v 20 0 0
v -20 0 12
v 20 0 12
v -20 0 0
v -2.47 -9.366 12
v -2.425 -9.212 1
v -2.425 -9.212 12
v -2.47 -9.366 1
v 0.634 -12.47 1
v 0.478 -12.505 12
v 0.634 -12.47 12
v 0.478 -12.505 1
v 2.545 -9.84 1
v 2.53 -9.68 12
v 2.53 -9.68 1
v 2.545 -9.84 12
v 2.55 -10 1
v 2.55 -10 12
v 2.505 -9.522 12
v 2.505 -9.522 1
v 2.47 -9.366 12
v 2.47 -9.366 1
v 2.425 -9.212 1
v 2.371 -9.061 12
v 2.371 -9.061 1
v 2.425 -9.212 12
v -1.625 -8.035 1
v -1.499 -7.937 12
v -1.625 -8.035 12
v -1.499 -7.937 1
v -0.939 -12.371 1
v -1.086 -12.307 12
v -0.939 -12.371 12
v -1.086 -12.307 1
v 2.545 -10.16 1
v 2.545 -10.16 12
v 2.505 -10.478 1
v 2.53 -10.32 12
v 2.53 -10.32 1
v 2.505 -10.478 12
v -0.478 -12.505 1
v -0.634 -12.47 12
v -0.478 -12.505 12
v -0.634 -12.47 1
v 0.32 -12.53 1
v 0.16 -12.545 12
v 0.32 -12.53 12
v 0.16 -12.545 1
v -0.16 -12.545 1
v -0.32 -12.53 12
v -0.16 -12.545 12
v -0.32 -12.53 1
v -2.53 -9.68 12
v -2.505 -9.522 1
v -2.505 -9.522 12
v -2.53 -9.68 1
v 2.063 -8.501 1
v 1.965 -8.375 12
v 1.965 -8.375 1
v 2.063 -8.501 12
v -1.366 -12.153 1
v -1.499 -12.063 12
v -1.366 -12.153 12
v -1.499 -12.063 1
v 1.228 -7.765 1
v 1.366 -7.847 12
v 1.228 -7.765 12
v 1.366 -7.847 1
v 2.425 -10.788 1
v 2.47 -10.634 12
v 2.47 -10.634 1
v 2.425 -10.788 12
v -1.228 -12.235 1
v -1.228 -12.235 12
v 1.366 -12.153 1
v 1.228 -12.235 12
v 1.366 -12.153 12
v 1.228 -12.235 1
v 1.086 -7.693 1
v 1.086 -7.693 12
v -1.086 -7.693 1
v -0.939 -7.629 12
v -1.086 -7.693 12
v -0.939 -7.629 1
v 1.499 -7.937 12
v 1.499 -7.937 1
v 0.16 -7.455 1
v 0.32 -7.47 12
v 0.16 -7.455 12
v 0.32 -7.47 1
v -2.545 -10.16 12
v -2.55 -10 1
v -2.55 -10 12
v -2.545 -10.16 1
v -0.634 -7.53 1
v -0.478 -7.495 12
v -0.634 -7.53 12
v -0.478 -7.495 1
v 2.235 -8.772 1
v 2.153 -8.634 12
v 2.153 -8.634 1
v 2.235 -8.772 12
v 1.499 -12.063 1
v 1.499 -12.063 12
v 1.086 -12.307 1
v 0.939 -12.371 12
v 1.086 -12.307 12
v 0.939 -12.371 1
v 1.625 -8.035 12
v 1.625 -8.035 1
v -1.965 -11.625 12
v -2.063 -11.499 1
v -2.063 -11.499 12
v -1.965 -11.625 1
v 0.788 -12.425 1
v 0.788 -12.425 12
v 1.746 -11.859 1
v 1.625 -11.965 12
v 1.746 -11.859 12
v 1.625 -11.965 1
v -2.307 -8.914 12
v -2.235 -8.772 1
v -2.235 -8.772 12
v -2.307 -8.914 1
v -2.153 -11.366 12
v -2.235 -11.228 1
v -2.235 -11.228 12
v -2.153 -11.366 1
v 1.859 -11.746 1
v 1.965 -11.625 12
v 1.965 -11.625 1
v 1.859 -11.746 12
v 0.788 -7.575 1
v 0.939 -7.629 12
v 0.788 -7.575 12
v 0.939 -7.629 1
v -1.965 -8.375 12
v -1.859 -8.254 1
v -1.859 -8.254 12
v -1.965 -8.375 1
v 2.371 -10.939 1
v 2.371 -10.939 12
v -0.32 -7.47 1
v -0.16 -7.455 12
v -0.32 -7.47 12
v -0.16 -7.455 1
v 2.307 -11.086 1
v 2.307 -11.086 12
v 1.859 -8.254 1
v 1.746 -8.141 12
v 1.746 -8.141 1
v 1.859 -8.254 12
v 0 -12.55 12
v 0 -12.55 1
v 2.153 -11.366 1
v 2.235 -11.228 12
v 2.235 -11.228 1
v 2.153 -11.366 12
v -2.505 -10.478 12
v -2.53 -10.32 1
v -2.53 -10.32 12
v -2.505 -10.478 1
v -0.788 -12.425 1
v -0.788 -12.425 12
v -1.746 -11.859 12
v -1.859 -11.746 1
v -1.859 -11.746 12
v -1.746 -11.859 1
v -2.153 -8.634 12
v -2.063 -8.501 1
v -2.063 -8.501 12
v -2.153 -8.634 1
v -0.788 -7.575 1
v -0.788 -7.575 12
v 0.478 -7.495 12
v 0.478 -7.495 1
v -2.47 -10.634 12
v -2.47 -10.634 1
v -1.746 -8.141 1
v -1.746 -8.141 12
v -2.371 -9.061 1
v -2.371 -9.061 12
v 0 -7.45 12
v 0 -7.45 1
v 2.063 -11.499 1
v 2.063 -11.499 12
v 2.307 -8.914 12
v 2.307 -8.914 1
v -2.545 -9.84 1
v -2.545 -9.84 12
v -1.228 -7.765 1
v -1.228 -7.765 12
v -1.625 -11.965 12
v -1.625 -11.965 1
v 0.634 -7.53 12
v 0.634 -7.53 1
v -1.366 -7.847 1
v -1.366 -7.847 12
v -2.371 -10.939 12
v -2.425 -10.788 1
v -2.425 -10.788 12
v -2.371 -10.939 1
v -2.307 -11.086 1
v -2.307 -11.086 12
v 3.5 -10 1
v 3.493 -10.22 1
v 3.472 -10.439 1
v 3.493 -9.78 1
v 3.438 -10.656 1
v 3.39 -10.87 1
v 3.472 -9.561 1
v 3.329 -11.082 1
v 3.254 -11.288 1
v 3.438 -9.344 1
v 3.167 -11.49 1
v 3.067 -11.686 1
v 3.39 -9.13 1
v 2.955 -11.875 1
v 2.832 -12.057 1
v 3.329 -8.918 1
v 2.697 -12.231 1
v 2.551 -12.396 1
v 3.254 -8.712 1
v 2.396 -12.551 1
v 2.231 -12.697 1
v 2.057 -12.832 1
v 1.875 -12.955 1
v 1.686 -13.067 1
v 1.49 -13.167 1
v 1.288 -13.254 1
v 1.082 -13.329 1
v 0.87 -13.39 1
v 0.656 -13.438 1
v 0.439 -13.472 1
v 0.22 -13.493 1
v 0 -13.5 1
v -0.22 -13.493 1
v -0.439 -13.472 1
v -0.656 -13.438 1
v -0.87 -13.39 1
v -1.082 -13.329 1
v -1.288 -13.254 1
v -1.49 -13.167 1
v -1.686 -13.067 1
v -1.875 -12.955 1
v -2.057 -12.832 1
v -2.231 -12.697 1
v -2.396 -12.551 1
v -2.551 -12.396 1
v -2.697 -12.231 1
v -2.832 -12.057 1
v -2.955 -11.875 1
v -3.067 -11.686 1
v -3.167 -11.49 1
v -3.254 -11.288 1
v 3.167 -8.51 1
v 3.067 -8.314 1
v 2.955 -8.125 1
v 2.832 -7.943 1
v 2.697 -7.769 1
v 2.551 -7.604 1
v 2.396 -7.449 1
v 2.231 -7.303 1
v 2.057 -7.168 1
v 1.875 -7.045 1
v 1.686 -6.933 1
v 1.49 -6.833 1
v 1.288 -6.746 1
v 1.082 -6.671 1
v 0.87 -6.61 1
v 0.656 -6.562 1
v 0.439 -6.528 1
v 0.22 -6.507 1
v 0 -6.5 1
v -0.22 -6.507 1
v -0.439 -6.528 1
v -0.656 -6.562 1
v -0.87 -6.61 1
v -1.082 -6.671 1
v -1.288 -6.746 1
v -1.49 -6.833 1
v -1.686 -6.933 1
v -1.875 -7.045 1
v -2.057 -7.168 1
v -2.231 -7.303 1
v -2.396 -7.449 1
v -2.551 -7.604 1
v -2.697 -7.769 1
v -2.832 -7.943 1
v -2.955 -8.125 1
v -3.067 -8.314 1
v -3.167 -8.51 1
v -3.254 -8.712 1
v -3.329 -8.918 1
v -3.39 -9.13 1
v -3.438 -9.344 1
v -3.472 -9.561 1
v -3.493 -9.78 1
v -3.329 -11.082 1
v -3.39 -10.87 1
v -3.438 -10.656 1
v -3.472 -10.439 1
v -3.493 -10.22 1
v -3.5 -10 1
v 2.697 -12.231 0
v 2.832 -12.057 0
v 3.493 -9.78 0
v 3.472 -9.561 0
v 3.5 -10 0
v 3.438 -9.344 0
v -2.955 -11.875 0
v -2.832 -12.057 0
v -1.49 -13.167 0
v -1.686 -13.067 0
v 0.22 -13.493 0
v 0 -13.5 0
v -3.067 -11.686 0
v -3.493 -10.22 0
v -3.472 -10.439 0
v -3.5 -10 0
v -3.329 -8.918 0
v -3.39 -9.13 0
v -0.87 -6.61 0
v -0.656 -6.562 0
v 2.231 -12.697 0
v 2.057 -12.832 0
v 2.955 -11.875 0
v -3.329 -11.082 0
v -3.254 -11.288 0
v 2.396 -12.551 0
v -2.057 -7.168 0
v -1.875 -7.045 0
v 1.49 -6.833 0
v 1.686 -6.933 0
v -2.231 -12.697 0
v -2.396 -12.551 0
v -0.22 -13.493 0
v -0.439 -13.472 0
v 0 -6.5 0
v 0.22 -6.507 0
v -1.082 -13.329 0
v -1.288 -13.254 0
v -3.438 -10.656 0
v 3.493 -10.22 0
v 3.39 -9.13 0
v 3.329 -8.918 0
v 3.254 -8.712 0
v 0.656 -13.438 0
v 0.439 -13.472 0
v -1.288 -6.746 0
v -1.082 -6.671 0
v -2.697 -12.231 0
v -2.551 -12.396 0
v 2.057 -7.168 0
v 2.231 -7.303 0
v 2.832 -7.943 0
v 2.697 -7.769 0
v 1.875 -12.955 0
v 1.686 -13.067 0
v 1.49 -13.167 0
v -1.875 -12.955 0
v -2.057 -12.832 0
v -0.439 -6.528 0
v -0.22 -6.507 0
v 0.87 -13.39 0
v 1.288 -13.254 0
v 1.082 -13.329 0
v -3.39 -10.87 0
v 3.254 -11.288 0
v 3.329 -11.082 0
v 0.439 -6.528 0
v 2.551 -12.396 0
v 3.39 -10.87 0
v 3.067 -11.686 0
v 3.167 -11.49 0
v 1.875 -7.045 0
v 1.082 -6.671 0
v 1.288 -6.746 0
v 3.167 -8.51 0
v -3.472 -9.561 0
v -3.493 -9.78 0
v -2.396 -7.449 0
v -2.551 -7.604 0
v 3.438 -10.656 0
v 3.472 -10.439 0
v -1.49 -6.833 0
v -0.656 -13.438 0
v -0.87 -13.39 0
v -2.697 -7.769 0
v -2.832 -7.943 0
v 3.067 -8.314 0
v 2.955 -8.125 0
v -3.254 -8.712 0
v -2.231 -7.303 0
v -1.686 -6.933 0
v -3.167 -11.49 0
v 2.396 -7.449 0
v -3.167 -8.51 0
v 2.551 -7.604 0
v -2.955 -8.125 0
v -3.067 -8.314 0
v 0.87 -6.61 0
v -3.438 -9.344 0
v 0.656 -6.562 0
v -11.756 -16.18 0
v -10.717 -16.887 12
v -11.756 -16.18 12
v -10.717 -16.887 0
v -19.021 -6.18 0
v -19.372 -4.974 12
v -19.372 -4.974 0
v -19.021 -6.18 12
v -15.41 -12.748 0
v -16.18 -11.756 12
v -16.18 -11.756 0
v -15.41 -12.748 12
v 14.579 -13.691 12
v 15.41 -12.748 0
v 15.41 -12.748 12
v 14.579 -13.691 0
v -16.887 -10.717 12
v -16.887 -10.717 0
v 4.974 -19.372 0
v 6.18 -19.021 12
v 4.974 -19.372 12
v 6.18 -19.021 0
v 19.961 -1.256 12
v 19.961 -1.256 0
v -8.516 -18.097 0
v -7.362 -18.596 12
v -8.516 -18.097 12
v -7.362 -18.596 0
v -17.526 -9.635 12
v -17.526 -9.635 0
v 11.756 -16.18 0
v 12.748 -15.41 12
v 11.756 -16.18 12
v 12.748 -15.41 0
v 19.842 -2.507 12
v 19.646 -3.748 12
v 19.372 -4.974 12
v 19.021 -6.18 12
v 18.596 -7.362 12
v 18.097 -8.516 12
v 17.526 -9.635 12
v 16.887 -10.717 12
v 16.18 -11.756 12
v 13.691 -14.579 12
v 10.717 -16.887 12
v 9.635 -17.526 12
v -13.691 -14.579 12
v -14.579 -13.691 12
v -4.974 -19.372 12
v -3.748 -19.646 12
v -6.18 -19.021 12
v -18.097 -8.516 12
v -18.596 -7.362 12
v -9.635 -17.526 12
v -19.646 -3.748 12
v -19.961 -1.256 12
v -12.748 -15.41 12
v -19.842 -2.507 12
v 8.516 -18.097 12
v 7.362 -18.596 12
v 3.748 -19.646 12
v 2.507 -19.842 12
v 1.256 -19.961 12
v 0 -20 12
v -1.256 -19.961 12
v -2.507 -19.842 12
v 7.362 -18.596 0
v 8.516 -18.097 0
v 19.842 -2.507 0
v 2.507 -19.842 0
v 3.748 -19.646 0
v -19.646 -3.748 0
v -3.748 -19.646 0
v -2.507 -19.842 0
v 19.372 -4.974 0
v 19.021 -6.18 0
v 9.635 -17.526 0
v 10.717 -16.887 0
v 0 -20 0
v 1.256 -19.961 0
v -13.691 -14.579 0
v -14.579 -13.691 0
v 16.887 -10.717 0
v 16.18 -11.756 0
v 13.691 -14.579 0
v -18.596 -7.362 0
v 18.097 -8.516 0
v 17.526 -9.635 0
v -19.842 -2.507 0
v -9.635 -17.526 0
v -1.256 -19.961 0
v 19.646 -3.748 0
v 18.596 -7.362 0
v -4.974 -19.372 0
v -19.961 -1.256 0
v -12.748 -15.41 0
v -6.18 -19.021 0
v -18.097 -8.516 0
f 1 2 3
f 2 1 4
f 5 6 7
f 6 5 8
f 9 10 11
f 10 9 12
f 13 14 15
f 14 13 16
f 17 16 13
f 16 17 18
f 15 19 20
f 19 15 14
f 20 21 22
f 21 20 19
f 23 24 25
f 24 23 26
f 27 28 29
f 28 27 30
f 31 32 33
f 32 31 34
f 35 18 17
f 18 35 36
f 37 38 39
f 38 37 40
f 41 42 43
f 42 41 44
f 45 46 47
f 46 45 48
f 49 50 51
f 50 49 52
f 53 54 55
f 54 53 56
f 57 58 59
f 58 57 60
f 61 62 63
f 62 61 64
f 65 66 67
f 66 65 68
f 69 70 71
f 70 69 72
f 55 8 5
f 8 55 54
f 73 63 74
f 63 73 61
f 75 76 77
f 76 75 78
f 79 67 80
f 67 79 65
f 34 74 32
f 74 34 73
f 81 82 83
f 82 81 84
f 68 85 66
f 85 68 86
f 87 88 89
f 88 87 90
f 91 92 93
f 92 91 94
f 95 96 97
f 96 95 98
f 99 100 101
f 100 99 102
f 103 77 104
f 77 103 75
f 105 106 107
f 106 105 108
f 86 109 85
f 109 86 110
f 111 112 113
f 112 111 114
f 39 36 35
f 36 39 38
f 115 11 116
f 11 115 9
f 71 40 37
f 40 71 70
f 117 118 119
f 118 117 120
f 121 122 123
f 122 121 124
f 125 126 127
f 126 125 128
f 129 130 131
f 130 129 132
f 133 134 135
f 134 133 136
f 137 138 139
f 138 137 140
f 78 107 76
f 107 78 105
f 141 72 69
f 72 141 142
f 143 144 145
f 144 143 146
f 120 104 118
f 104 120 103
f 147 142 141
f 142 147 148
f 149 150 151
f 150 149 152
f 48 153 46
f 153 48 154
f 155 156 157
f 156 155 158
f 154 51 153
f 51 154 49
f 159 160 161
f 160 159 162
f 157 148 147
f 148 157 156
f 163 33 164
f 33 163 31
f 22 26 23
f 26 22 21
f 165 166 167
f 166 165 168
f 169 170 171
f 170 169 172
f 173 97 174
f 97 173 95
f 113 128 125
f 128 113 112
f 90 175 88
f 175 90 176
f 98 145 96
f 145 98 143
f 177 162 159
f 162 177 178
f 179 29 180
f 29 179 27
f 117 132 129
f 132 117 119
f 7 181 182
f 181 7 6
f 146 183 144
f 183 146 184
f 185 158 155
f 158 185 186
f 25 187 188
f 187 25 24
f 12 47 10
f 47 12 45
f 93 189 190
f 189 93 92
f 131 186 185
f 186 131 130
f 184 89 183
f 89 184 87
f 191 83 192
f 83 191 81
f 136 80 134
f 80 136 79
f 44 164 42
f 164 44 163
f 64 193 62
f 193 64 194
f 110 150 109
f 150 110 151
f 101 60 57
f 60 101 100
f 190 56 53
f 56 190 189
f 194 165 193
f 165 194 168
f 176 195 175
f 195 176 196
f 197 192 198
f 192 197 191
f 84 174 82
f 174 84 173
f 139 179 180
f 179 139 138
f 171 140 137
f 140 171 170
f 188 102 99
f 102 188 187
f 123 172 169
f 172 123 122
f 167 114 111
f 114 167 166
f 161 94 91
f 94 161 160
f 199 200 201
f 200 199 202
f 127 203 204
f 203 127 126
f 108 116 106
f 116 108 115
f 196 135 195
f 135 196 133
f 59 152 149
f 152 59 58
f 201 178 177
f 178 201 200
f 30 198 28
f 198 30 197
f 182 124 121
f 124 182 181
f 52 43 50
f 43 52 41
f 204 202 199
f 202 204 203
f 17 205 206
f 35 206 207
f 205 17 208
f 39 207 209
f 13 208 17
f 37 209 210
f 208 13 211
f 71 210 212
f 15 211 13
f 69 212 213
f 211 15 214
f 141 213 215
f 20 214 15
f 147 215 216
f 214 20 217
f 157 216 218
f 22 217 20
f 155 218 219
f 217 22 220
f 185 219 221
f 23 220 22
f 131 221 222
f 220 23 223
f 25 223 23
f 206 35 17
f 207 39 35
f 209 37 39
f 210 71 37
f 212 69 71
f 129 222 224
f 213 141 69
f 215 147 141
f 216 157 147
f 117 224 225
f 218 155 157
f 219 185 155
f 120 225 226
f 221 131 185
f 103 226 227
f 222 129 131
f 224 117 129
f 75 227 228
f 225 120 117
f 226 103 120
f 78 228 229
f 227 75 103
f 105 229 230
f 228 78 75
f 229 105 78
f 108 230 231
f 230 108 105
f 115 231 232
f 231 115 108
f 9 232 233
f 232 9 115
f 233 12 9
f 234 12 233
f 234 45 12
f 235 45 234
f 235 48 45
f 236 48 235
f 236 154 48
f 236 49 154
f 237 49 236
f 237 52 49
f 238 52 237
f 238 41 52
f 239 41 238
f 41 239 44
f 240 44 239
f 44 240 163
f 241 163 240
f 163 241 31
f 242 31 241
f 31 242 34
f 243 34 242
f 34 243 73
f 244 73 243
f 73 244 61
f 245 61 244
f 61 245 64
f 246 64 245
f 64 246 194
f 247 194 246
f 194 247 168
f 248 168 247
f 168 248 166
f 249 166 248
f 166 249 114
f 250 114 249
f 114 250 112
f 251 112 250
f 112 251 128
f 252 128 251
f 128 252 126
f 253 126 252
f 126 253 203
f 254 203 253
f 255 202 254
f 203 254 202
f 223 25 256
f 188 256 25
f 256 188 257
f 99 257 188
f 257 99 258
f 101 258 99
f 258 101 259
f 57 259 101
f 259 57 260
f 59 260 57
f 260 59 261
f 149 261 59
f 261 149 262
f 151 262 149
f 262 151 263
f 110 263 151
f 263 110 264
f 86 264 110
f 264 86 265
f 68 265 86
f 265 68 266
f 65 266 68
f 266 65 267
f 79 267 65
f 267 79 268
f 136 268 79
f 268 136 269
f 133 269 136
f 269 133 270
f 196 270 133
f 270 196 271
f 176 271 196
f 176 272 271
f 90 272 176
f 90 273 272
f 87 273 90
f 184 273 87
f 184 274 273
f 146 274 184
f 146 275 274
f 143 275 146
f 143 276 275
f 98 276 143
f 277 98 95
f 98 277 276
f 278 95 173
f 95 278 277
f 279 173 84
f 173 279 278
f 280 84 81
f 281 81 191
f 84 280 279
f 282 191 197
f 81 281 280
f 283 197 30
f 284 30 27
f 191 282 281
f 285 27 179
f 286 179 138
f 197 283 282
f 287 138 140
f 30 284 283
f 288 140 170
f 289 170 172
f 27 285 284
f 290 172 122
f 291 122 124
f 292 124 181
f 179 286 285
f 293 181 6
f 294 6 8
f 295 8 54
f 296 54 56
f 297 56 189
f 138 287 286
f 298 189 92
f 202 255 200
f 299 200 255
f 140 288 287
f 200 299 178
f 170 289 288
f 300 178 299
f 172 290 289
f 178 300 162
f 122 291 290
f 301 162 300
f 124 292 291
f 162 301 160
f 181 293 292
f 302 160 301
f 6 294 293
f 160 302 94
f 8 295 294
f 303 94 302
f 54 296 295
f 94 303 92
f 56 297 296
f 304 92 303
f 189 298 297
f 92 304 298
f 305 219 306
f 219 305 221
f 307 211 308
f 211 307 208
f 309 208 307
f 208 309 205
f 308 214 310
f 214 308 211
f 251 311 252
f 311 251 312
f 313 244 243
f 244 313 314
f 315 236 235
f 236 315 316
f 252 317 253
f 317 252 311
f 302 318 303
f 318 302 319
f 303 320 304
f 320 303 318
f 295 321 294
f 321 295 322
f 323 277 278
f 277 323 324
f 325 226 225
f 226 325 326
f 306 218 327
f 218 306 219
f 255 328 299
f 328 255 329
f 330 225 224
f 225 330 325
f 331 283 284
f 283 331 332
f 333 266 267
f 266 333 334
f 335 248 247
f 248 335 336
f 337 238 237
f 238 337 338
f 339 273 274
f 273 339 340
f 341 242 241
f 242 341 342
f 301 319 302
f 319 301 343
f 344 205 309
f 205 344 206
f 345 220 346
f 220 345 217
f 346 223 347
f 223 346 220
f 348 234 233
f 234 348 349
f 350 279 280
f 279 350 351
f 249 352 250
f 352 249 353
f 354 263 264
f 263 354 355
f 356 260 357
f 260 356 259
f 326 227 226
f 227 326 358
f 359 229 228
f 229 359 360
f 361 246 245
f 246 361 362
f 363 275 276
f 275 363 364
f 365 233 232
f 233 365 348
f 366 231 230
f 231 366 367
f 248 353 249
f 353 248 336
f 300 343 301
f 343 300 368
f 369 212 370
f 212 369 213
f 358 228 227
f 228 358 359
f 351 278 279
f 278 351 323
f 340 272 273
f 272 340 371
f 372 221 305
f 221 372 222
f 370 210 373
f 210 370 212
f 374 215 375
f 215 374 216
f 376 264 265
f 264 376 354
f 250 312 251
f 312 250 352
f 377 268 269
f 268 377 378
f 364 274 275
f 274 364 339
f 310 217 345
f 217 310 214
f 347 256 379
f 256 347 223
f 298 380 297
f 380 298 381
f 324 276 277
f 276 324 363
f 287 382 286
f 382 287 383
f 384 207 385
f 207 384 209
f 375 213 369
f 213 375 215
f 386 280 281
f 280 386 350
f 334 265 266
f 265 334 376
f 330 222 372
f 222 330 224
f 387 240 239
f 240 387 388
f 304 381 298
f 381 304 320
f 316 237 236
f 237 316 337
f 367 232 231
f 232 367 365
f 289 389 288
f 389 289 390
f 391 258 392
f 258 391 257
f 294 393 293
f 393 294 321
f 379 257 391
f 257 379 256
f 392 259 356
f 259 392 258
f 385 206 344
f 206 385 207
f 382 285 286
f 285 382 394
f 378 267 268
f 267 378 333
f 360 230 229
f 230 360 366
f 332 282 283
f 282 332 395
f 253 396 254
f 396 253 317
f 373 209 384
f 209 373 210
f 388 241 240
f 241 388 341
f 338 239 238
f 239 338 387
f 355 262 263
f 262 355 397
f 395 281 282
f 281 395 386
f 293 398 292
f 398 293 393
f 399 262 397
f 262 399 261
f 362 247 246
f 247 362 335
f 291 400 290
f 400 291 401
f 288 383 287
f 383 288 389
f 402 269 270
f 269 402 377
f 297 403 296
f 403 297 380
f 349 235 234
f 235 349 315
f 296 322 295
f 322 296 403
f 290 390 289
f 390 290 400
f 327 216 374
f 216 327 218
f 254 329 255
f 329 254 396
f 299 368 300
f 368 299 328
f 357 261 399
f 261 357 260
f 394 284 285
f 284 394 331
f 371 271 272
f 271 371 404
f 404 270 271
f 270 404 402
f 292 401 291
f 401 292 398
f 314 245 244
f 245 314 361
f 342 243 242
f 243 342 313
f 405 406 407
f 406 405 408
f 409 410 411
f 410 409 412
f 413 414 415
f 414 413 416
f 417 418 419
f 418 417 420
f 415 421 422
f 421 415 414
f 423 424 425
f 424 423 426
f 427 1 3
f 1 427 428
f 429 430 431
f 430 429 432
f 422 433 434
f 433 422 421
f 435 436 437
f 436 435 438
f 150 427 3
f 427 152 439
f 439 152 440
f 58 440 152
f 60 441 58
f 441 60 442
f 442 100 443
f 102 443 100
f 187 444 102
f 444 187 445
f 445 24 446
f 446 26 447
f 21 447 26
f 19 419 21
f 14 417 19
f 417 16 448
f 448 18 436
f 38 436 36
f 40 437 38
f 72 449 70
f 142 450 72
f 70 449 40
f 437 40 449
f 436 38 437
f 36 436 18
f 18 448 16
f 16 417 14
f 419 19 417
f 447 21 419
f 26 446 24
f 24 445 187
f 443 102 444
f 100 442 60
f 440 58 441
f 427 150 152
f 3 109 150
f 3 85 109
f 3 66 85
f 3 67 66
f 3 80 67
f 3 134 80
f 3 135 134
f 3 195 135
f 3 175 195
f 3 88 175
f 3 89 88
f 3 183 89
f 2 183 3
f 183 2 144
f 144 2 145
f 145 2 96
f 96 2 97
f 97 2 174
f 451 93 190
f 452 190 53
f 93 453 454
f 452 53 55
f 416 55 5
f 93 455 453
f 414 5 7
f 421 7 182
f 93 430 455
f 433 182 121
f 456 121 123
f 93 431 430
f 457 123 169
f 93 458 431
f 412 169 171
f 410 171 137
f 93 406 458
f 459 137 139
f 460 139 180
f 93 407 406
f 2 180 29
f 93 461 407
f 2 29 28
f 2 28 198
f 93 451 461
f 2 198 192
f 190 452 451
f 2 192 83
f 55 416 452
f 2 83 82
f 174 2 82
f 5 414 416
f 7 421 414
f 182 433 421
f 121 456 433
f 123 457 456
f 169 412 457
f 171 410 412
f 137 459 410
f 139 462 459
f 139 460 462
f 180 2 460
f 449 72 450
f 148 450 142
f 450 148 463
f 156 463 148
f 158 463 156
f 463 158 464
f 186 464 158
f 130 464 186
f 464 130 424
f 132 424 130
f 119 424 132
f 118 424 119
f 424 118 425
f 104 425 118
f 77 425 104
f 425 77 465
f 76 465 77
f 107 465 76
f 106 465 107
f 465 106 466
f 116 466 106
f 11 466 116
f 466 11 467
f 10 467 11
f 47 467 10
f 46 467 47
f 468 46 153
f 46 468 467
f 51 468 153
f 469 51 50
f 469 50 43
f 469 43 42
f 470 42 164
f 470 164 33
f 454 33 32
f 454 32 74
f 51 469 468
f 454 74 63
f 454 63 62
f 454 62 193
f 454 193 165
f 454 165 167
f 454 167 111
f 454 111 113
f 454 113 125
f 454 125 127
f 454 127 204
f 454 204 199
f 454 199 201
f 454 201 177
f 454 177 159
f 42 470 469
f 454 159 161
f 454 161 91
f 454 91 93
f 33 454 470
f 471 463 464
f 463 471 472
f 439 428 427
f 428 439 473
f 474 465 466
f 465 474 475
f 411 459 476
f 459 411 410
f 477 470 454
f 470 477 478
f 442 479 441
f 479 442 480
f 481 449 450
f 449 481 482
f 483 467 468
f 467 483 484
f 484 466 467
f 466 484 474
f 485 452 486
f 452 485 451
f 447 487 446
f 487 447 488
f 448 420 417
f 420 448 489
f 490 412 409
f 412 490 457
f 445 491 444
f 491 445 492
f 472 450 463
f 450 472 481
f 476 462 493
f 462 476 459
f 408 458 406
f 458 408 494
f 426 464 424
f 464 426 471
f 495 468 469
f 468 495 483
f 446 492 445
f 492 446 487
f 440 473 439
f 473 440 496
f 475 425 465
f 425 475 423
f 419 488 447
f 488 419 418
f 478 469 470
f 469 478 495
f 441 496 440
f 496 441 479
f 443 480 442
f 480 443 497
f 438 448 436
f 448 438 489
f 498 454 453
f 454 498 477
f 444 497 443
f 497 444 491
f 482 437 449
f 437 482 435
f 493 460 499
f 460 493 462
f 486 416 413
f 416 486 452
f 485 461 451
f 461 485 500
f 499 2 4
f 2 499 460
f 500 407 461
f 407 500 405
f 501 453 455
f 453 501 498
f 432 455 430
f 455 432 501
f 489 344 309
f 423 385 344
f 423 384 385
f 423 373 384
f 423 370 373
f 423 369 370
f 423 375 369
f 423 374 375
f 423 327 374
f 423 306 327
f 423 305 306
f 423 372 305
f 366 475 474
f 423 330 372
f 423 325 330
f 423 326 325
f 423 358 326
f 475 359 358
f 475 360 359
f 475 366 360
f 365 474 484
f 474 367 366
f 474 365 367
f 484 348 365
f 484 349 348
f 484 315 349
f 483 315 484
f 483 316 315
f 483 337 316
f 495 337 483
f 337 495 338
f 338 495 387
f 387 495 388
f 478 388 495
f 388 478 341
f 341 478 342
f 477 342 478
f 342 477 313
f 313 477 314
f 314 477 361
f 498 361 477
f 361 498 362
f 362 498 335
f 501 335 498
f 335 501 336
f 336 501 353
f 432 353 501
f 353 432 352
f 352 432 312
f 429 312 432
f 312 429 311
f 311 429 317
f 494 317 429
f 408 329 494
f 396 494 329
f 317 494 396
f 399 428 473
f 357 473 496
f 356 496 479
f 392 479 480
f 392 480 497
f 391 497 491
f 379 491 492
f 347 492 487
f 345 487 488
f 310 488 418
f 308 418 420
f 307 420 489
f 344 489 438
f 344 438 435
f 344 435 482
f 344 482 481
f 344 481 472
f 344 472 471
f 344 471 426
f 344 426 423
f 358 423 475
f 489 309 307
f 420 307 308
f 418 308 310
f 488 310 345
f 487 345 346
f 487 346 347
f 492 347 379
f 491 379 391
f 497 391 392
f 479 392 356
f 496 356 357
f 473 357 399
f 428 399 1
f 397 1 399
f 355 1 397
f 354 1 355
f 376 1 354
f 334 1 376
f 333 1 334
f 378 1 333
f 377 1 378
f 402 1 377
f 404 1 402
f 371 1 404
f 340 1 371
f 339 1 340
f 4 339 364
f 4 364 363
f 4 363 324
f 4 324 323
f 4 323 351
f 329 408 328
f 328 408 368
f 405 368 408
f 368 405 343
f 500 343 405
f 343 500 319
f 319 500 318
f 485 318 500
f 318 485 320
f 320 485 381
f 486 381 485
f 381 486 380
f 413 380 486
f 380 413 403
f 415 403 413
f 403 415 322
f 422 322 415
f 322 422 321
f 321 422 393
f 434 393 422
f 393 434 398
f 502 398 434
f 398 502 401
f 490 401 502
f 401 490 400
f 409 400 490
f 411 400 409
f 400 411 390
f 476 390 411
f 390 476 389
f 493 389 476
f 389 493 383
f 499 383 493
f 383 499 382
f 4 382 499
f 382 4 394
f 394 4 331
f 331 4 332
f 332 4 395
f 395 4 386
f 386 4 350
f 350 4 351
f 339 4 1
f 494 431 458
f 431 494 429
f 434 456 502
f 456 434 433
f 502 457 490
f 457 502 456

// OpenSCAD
$fn=100;
cut=100;



difference() {
	cylinder(d=40, h=12);
	translate([0, 0, -1]) union() {
		translate([-cut/2, 0]) cube(cut);
		translate([0, -10]) cylinder(d=5.1, h=cut);
		translate([0, -10]) cylinder(d=7, h=2);
	}

}
